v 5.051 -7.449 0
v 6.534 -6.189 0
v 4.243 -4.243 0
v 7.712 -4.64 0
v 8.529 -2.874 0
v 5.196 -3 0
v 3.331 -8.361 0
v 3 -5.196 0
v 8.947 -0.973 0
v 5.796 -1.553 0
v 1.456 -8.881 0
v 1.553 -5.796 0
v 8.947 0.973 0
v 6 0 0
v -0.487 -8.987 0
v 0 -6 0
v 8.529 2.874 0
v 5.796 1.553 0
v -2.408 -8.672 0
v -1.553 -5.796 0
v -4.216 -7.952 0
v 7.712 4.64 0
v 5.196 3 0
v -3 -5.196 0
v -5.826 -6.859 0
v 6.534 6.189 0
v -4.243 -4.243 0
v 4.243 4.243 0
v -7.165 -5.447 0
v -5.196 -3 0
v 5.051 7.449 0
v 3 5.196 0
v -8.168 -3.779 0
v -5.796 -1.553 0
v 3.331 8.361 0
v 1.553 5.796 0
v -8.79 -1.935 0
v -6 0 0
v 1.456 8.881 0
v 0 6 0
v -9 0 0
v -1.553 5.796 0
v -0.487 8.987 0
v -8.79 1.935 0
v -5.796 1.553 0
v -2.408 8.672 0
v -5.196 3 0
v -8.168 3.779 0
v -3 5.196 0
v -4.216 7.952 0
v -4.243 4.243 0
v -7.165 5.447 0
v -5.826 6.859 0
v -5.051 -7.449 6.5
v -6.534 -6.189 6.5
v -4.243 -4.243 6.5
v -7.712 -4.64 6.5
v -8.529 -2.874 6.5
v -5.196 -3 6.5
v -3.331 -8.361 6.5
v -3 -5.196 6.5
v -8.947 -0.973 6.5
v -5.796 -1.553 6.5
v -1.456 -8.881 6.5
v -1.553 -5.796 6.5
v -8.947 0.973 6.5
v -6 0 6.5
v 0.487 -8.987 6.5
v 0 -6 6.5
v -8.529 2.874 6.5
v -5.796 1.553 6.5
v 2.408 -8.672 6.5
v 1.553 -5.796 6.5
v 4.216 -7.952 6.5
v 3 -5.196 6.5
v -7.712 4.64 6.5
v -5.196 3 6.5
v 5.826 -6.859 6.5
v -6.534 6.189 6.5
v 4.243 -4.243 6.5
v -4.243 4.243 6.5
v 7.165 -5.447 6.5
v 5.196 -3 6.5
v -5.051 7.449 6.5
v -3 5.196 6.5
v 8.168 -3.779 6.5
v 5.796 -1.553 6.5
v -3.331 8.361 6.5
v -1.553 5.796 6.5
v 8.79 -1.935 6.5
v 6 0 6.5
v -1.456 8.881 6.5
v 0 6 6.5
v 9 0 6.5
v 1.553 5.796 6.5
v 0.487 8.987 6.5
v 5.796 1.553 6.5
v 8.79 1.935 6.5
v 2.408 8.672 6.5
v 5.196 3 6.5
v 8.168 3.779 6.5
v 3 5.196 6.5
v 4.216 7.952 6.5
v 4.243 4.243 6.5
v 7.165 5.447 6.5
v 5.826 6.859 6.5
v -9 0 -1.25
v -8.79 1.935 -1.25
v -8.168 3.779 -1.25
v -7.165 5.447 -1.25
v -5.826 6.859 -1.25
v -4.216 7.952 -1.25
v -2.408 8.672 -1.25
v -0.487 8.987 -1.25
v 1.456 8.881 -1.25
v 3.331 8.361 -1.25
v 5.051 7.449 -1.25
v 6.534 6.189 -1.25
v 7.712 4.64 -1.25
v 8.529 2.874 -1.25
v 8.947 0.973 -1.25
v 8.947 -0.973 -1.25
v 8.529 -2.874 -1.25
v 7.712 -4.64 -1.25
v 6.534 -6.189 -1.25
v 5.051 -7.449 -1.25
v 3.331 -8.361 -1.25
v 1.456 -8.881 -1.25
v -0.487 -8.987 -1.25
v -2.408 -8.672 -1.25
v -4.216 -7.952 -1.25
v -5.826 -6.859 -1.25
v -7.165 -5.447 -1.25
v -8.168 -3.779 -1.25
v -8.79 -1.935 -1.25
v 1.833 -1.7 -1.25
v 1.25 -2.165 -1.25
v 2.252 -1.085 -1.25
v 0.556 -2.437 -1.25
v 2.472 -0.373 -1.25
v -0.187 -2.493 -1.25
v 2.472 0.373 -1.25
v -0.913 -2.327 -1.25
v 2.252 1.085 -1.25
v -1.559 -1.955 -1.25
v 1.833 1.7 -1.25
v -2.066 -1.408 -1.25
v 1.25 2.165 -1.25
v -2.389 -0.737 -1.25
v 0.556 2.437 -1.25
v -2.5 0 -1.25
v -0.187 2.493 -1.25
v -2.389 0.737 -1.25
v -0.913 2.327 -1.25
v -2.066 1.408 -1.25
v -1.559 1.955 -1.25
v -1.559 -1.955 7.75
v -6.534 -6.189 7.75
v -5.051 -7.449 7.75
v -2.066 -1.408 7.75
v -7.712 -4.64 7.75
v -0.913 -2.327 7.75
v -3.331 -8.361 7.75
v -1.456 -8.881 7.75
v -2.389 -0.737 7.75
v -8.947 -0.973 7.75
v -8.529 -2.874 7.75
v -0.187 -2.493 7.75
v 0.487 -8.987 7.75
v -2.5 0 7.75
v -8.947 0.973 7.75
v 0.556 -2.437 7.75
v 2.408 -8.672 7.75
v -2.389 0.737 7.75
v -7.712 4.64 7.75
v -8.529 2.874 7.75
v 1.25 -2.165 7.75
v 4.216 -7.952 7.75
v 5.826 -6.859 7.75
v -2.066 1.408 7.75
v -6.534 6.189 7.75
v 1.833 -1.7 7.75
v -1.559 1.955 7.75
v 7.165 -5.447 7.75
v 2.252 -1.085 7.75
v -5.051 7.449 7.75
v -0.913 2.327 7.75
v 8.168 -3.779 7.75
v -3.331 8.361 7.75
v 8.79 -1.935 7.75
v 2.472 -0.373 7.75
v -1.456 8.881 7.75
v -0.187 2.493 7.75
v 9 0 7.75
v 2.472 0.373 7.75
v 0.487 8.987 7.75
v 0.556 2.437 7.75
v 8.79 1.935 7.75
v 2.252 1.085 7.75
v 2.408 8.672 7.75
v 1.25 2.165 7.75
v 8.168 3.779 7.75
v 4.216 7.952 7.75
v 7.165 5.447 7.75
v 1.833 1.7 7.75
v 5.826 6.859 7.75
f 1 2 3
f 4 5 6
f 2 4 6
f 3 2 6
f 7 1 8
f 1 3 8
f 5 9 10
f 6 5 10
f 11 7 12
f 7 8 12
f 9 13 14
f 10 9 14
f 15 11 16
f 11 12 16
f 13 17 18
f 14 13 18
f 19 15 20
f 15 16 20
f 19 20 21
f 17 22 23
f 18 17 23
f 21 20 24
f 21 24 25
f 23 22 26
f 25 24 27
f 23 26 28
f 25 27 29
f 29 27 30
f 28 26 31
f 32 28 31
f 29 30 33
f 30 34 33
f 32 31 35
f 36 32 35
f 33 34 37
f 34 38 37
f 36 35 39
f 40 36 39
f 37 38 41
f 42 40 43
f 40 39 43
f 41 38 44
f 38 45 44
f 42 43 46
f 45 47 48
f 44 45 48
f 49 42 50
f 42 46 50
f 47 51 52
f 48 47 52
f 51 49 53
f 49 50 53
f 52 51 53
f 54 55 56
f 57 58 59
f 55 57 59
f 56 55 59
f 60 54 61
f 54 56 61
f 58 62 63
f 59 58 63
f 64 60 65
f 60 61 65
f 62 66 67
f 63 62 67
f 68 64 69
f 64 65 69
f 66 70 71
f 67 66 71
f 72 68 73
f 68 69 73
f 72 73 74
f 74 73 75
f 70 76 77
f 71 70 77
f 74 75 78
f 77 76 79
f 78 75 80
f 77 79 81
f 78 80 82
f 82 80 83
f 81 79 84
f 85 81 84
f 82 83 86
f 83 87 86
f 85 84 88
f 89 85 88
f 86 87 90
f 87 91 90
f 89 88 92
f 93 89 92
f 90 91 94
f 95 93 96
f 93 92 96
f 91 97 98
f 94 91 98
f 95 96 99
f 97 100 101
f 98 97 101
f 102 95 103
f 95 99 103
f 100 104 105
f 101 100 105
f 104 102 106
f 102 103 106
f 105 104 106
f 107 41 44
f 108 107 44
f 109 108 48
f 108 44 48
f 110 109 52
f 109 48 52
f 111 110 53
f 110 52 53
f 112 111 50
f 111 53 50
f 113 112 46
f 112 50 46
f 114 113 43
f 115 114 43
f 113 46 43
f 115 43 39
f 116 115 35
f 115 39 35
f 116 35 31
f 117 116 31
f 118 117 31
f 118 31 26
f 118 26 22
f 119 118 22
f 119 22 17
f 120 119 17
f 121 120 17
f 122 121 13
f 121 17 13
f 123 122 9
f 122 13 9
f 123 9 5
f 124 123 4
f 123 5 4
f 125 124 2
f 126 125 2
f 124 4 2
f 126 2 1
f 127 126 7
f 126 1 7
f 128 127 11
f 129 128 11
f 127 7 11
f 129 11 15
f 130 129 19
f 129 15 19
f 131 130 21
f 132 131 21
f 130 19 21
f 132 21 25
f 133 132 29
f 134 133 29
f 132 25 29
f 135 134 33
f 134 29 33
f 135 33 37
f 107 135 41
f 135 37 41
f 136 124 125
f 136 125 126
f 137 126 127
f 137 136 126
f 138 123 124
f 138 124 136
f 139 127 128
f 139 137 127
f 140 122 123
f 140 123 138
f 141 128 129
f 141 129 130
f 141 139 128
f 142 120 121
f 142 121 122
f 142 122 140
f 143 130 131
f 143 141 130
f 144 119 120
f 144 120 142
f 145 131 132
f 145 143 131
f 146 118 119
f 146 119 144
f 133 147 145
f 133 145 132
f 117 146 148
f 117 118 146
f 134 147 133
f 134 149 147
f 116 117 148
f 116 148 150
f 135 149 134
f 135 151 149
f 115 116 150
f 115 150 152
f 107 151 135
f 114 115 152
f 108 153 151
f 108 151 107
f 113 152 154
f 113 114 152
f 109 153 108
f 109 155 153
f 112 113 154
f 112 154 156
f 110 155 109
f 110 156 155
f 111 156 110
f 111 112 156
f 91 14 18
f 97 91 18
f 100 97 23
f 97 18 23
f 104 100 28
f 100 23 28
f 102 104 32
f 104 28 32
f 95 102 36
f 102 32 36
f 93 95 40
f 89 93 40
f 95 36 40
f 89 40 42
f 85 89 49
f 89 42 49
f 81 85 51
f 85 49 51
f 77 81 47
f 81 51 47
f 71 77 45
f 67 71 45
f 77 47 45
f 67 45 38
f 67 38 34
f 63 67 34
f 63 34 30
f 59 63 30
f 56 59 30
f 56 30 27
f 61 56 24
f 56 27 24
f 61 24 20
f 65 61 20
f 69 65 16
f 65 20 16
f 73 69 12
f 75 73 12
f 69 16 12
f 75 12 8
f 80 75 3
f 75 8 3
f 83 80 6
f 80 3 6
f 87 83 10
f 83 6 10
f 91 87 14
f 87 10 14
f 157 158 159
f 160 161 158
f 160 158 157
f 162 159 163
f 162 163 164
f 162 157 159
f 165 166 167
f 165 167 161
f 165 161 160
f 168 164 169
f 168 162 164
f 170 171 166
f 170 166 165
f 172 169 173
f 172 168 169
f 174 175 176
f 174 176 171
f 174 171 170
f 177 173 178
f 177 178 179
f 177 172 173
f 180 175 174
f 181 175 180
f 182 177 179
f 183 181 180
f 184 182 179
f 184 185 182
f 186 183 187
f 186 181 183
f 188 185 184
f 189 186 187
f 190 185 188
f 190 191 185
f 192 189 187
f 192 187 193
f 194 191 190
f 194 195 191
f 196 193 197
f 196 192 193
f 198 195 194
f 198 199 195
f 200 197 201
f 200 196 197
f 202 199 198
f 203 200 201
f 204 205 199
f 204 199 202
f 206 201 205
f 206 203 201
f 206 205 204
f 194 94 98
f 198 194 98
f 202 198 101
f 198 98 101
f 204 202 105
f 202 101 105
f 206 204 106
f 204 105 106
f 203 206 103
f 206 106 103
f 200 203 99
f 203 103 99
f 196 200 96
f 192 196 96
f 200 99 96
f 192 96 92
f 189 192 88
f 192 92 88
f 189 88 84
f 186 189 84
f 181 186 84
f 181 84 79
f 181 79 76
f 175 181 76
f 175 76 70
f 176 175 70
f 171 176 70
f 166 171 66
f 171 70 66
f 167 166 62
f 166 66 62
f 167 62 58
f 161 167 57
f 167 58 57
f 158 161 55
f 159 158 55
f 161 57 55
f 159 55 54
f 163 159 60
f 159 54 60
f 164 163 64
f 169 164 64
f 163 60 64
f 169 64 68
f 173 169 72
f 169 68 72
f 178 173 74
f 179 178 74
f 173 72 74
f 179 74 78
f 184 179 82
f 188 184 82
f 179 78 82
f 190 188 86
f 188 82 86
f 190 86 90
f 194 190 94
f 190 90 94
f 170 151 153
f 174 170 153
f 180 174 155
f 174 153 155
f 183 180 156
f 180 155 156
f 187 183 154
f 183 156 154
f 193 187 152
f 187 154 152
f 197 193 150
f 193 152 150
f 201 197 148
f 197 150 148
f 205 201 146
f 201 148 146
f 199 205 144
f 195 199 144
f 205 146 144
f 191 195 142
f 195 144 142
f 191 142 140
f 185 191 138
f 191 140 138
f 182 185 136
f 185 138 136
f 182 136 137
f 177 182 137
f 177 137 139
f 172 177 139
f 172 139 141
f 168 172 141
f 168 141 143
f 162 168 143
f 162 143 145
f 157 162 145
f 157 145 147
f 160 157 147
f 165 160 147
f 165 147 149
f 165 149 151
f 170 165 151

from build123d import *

# Parameters (mm, degrees)
CROQUIS1_R              = 6
SALIENTE_EXTRUIR1_DEPTH = 6.5
CROQUIS2_R              = 9
SALIENTE_EXTRUIR2_DEPTH = 1.25
CROQUIS3_R              = 9
SALIENTE_EXTRUIR3_DEPTH = 1.25
CROQUIS4_R              = 2.5
CORTAR_EXTRUIR1_DEPTH   = 10


with BuildPart() as part:
    # Croquis1 → Saliente-Extruir1 (new body)
    with BuildSketch(Plane.XY):
        Circle(CROQUIS1_R)
    extrude(amount=SALIENTE_EXTRUIR1_DEPTH)

    # Croquis2 → Saliente-Extruir2 (add)
    with BuildSketch(Plane.XY.offset(6.5)):
        Circle(CROQUIS2_R)
    extrude(amount=SALIENTE_EXTRUIR2_DEPTH)

    # Croquis3 → Saliente-Extruir3 (add)
    with BuildSketch(Plane(origin=(0, 0, 0), x_dir=(-1, 0, 0), z_dir=(0, 0, -1))):
        Circle(CROQUIS3_R)
    extrude(amount=SALIENTE_EXTRUIR3_DEPTH)

    # Croquis4 → Cortar-Extruir1 (cut, through all)
    with BuildSketch(Plane(origin=(0, 0, -1.25), x_dir=(-1, 0, 0), z_dir=(0, 0, -1))):
        Circle(CROQUIS4_R)
    extrude(amount=-CORTAR_EXTRUIR1_DEPTH, mode=Mode.SUBTRACT)


solid = part.part
